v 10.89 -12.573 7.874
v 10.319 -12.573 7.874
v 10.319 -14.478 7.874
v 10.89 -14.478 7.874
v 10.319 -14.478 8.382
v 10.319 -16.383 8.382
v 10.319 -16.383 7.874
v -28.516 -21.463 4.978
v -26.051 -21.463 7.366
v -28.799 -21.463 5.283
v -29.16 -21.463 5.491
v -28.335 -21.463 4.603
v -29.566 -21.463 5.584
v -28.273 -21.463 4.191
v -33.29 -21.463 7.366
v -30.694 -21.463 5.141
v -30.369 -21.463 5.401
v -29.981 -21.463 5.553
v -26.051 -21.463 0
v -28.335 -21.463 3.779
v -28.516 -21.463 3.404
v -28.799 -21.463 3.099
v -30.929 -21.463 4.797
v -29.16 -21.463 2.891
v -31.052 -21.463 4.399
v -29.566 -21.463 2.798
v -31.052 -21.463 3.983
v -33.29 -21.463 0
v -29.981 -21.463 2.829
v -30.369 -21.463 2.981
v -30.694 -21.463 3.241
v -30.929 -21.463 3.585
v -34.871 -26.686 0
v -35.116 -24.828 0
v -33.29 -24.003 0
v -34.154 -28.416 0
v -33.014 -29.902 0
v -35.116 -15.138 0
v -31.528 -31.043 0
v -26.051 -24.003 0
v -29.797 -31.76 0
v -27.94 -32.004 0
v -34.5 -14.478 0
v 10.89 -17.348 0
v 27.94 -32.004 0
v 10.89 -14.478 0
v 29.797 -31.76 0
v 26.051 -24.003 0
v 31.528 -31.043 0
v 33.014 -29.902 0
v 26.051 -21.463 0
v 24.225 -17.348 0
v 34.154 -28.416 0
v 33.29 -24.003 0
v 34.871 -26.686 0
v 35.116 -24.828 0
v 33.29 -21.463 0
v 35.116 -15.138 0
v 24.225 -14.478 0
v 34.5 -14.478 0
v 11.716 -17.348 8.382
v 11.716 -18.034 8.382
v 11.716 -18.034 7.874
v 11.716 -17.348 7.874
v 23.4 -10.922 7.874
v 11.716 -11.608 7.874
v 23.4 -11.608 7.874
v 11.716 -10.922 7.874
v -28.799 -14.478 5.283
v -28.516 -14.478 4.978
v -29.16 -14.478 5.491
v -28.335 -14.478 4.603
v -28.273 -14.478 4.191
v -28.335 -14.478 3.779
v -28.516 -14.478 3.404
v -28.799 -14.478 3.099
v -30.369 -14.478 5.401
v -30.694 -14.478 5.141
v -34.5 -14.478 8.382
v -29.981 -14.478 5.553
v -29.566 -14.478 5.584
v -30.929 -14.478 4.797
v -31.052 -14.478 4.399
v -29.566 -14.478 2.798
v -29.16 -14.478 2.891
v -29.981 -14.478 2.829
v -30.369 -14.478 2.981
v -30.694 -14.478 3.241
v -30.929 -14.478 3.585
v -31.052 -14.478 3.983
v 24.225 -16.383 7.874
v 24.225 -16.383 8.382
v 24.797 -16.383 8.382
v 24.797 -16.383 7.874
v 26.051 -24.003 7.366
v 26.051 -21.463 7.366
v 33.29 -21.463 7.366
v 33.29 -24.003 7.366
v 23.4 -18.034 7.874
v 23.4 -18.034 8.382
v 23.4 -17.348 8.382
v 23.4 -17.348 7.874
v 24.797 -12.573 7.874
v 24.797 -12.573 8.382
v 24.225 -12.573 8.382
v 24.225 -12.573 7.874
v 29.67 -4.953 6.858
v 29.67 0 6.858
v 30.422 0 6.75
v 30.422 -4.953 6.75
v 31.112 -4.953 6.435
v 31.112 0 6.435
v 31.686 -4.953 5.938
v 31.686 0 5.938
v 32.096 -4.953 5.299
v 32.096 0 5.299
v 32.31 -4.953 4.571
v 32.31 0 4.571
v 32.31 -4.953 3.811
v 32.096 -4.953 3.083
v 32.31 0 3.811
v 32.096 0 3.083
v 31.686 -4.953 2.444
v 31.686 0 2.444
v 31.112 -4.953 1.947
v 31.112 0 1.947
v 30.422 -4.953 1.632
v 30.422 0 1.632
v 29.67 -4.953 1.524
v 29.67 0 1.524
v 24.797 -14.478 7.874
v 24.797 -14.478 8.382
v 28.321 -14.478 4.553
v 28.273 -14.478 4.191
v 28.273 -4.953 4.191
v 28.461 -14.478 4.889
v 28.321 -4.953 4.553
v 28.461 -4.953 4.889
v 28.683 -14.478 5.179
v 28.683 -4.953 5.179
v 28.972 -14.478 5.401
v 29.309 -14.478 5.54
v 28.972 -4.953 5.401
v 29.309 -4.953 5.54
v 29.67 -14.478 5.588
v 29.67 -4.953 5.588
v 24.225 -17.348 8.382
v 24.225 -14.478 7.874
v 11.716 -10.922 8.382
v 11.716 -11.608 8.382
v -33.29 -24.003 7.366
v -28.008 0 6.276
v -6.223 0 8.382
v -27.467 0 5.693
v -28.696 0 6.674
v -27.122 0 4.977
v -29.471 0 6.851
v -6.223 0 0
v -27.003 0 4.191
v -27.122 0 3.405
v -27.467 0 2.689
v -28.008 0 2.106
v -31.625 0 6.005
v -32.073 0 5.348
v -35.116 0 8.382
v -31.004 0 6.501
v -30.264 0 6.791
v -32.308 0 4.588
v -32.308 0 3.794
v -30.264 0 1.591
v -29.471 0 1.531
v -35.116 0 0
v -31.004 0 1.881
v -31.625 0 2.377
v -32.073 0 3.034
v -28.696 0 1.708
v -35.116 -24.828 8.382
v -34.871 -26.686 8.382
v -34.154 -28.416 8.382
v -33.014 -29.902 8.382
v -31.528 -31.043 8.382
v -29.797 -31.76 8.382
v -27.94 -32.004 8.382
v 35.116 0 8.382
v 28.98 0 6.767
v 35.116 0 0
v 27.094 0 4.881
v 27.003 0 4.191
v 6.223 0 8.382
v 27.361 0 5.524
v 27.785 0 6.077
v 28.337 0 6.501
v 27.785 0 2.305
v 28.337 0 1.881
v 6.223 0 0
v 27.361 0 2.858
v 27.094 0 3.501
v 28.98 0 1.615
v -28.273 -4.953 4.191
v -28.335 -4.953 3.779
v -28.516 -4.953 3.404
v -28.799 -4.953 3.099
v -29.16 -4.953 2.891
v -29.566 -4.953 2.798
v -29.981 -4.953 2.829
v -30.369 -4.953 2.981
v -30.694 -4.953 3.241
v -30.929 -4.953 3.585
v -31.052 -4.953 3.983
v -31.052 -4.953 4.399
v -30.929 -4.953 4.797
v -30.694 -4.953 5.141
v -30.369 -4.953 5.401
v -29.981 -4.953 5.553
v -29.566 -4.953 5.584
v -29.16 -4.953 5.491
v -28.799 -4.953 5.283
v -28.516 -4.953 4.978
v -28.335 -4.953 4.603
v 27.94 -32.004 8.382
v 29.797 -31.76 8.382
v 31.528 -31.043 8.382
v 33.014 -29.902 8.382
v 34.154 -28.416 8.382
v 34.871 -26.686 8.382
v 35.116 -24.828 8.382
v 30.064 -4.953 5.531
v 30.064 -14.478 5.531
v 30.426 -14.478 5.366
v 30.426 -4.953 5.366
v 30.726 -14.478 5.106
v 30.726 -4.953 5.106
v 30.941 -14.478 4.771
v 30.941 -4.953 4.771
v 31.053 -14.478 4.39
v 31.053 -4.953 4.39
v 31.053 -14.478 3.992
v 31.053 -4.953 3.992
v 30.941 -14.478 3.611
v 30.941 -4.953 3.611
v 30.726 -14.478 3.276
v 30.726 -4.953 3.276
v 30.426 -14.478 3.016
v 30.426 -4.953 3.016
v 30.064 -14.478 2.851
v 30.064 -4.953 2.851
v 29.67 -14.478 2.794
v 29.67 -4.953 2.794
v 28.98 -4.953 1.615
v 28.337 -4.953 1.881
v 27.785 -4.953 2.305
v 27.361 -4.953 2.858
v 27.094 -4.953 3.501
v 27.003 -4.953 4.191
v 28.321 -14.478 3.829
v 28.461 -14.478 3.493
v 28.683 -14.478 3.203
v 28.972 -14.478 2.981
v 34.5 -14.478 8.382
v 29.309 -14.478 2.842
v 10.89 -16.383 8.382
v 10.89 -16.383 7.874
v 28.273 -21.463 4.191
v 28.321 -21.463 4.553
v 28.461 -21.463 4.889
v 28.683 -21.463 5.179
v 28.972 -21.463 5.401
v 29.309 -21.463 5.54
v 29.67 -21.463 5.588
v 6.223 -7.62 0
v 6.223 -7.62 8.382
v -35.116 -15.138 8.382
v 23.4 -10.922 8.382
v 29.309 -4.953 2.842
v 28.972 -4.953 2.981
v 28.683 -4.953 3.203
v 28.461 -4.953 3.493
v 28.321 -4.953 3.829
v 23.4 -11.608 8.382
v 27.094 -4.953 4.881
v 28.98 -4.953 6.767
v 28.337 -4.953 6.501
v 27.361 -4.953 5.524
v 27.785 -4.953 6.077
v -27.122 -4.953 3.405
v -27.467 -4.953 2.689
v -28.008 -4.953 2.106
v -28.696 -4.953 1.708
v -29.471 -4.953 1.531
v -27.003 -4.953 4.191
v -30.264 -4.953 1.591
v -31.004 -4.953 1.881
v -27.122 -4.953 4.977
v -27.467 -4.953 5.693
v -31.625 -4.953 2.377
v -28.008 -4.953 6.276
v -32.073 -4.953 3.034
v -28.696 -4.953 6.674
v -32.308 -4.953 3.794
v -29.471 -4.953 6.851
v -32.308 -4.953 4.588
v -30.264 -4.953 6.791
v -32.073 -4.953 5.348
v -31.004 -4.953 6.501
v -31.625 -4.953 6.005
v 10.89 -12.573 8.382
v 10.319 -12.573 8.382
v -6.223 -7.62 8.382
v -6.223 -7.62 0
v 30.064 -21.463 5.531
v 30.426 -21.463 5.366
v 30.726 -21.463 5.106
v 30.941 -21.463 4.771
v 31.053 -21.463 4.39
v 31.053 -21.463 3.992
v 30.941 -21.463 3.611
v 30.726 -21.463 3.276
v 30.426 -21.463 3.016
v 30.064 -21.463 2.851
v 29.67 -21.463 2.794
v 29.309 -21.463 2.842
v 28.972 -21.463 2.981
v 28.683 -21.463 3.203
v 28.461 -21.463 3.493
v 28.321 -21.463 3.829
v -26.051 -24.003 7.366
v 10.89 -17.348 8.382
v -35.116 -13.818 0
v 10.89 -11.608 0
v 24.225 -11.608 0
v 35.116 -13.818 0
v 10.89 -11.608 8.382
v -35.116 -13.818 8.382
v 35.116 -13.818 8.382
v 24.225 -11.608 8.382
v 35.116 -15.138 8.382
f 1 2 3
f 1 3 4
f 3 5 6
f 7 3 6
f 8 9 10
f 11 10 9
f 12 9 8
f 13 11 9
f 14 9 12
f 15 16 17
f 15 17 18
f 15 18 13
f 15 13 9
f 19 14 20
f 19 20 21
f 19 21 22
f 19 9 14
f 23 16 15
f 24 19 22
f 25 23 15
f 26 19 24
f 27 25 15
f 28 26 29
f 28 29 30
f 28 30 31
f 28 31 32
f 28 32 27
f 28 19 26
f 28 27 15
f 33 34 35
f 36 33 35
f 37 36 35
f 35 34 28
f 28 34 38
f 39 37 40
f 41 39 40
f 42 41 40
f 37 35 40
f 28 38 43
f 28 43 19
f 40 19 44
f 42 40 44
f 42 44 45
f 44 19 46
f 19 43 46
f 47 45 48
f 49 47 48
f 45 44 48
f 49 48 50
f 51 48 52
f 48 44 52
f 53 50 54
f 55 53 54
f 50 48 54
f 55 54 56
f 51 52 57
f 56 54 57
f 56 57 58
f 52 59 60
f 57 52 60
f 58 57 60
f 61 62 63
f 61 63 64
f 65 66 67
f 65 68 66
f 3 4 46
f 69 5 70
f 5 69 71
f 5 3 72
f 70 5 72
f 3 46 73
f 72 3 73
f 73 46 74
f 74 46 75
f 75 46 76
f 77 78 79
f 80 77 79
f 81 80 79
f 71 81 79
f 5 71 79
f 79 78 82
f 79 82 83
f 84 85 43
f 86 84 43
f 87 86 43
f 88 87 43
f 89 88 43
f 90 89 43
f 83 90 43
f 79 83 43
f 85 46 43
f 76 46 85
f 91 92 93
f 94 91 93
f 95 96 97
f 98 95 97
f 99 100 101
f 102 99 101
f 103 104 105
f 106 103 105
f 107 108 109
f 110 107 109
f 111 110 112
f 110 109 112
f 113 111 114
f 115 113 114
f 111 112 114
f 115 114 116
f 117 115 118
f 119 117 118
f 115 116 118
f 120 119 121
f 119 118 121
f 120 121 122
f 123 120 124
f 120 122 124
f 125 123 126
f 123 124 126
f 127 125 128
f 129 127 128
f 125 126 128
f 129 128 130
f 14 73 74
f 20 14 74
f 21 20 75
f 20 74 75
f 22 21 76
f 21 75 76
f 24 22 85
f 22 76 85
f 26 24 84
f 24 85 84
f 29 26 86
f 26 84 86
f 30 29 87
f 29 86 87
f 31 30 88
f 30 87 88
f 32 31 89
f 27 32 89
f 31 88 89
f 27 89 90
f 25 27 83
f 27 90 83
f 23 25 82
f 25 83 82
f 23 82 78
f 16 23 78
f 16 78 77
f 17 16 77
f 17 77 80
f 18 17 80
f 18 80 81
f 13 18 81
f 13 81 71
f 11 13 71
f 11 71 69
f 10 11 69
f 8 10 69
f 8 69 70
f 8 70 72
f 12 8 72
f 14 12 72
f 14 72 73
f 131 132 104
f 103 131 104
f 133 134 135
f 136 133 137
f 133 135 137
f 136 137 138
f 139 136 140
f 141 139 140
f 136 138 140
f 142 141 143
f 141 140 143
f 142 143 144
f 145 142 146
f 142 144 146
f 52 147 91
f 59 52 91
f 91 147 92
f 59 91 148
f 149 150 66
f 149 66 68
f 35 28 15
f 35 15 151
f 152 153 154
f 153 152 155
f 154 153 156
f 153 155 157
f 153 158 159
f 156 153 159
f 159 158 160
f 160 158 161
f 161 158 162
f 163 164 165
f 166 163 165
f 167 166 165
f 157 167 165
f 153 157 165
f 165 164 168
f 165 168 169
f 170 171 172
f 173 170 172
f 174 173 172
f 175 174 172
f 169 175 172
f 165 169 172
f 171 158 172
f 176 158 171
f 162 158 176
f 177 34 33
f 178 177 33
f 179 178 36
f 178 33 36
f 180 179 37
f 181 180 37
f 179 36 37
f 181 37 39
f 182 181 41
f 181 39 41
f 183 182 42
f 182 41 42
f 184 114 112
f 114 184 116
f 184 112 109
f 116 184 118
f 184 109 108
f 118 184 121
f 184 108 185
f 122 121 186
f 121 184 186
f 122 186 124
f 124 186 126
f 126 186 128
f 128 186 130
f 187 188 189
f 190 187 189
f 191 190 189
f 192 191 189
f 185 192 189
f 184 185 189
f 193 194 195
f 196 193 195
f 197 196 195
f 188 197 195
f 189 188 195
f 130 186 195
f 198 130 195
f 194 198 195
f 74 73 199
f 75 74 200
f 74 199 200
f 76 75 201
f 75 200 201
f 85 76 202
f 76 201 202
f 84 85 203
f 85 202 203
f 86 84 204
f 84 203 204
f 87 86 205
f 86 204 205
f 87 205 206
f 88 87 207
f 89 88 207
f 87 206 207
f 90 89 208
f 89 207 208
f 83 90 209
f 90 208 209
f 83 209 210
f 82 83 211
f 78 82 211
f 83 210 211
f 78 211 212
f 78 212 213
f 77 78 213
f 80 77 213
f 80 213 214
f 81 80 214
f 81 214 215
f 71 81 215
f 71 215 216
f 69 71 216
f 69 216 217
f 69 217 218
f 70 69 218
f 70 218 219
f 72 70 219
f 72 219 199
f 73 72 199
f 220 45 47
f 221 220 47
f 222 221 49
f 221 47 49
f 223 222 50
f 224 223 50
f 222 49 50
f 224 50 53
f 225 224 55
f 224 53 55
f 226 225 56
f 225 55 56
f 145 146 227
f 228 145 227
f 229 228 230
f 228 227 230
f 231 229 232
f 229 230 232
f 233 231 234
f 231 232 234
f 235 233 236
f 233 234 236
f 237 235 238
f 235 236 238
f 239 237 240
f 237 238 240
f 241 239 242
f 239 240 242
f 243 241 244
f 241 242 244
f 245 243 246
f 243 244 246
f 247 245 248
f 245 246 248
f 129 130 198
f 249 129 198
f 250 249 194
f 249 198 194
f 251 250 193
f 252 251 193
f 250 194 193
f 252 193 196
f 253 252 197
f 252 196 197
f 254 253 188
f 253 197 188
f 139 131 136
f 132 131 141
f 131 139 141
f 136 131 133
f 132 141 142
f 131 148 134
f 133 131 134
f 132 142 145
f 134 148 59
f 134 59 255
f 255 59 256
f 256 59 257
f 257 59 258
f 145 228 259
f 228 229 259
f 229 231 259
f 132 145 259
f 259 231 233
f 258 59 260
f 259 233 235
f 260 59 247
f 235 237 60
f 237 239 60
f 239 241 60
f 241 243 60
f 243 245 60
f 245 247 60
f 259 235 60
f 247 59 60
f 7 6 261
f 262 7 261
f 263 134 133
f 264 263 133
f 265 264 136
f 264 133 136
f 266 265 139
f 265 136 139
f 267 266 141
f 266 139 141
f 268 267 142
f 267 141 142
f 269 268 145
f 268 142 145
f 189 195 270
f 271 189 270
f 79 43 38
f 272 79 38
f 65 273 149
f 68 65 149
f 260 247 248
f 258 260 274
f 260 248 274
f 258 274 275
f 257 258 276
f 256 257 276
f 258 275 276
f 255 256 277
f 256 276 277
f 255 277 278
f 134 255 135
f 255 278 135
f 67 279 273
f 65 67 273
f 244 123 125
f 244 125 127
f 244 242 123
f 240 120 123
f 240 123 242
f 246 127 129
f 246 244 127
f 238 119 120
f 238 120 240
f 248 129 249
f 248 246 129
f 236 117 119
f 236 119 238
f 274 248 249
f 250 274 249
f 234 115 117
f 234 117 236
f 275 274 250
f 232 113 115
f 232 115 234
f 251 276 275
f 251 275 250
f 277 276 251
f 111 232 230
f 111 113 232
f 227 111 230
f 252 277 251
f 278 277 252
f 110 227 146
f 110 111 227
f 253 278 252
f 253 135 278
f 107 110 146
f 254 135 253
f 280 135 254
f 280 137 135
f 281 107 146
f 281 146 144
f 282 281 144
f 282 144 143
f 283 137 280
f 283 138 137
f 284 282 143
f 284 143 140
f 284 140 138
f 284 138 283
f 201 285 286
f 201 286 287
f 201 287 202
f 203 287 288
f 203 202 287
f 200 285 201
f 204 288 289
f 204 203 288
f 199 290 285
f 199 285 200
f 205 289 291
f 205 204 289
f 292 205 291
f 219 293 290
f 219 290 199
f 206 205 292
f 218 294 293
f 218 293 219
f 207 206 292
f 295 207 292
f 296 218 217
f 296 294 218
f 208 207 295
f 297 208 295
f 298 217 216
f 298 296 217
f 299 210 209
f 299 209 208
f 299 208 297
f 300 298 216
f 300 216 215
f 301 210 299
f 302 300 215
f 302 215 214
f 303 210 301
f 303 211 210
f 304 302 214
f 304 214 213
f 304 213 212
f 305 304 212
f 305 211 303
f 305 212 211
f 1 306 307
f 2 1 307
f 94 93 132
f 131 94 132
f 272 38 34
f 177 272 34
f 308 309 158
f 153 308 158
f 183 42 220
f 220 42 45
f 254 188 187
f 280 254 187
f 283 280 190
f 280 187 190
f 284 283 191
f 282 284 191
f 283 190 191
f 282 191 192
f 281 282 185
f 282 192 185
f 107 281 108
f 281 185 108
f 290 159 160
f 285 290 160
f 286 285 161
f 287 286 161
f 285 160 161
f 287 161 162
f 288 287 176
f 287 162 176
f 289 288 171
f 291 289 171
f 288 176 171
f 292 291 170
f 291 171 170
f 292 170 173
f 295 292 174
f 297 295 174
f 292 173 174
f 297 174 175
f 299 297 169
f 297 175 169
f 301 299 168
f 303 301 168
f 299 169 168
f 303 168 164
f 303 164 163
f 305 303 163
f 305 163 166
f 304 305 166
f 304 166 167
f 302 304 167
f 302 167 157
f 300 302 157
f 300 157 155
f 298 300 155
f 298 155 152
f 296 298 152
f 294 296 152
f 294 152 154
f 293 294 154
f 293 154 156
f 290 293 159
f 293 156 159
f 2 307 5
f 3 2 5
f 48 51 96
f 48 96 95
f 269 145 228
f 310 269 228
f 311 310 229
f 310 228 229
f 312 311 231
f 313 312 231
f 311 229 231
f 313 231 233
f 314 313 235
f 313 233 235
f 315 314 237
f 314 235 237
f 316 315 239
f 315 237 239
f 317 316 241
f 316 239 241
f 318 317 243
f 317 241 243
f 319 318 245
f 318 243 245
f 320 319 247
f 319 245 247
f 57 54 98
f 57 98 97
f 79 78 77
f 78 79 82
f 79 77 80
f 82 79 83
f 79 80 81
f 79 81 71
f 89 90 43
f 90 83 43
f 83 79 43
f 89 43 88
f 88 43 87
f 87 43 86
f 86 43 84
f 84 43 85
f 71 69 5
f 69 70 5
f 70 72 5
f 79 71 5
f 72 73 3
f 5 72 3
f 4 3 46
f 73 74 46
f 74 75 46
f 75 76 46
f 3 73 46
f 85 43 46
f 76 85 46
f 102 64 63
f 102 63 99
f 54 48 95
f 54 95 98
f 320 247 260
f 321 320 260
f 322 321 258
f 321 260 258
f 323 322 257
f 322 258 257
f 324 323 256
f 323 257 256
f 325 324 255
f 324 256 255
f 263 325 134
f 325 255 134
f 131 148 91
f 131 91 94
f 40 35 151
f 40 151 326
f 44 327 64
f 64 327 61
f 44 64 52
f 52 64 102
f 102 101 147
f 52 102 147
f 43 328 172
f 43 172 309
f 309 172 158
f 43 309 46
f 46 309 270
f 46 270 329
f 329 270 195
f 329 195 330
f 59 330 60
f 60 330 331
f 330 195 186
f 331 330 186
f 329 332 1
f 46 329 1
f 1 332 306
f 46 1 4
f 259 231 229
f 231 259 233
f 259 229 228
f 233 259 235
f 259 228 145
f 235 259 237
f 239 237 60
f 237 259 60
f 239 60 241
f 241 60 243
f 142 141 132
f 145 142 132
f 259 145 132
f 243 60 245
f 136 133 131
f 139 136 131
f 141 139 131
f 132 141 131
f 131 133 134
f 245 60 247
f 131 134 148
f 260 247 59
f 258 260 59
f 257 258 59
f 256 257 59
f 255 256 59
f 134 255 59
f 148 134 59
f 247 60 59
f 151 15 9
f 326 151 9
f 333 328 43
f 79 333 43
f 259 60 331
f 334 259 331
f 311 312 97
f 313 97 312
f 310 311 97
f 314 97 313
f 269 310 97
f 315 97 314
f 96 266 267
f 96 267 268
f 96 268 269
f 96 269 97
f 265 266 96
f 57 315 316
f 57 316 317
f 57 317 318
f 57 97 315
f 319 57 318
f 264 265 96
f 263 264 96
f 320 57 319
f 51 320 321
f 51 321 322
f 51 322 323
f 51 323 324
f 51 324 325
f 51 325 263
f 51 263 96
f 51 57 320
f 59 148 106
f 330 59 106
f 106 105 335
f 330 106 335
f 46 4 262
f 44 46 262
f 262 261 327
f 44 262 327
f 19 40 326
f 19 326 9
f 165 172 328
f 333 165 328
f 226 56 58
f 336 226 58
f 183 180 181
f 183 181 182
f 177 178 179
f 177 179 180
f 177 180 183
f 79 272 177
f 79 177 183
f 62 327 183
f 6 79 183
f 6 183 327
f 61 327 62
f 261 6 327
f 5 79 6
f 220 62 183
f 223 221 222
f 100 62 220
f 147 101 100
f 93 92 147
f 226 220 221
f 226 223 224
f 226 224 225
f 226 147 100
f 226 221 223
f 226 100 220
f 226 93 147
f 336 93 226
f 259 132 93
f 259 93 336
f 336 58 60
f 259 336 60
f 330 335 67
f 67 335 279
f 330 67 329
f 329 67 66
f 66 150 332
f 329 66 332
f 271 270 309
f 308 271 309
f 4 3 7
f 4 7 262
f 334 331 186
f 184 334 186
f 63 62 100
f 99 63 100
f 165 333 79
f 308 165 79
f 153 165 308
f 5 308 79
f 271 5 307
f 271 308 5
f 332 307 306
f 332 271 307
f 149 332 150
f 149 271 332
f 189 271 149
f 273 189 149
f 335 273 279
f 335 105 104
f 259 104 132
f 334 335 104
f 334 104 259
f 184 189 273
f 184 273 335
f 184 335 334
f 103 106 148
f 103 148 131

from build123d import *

# Parameters (mm, degrees)
F1_DEPTH  = 8.382
F2_DEPTH  = 8.382
F3_W      = 6.6675
F3_H      = 2.8702
F4_DEPTH  = 25.4
F5_W      = 3.6195
F5_H      = 1.27
F6_DEPTH  = 7.366
F8_DEPTH  = 24.003
F9_DEPTH  = 4.953
F10_W     = 0.5715
F10_H     = 1.905
F10_W_2   = 5.842
F10_H_2   = 1.651
F10_H_3   = 0.6858
F11_DEPTH = 0.508


with BuildPart() as f1:
    # F0 (on Top) → F1 (new body)
    with BuildSketch(Plane.XY):
        Polygon((-6.223, -7.62), (-6.223, 0), (-35.1155, 0), (-35.1155, -13.8176), (-34.49955, -14.478), (0, -14.478), (0, -7.62), align=None)
        Polygon((35.1155, 0), (6.223, 0), (6.223, -7.62), (0, -7.62), (0, -14.478), (34.49955, -14.478), (35.1155, -13.8176), align=None)
    extrude(amount=F1_DEPTH)


with BuildPart() as f2:
    # F0 (on Top) → F2 (new body)
    with BuildSketch(Plane.XY):
        with BuildLine():
            Line((0, -32.004), (0, -14.478))
            Line((0, -14.478), (-34.49955, -14.478))
            Line((-34.49955, -14.478), (-35.1155, -15.1384))
            Line((-35.1155, -15.1384), (-35.1155, -24.8285))
            ThreePointArc((-35.1155, -24.8285), (-27.94, -17.653), (-20.7645, -24.8285))
            ThreePointArc((-20.7645, -24.8285), (-22.8661552916, -29.9023447084), (-27.94, -32.004))
            Line((-27.94, -32.004), (0, -32.004))
        make_face()
        with BuildLine():
            ThreePointArc((-35.1155, -24.8285), (-33.0138447084, -29.9023447084), (-27.94, -32.004))
            ThreePointArc((-27.94, -32.004), (-22.8661552916, -29.9023447084), (-20.7645, -24.8285))
            ThreePointArc((-20.7645, -24.8285), (-27.94, -17.653), (-35.1155, -24.8285))
        make_face()
        with BuildLine():
            Line((34.49955, -14.478), (0, -14.478))
            Line((0, -14.478), (0, -32.004))
            Line((0, -32.004), (27.94, -32.004))
            ThreePointArc((27.94, -32.004), (22.8661552916, -19.7546552916), (35.1155, -24.8285))
            Line((35.1155, -24.8285), (35.1155, -15.1384))
            Line((35.1155, -15.1384), (34.49955, -14.478))
        make_face()
        with BuildLine():
            ThreePointArc((35.1155, -24.8285), (22.8661552916, -19.7546552916), (27.94, -32.004))
            ThreePointArc((27.94, -32.004), (33.0138447084, -29.9023447084), (35.1155, -24.8285))
        make_face()
    extrude(amount=F2_DEPTH)


with BuildPart() as f4_tool:
    # F3 (on face) → F4 (new body)
    with BuildSketch(Plane.XY.offset(8.382)):
        with Locations((14.224, -13.0429)):
            Rectangle(F3_W, F3_H)
        with Locations((20.8915, -13.0429)):
            Rectangle(F3_W, F3_H)
        Polygon((17.55775, -14.478), (10.89025, -14.478), (10.89025, -17.3482), (24.22525, -17.3482), (24.22525, -14.478), align=None)
    extrude(amount=-F4_DEPTH)


with BuildPart() as f1_1:
    add(f1.part)

    # F4: cut by f4_tool
    add(f4_tool.part, mode=Mode.SUBTRACT)


with BuildPart() as f2_1:
    add(f2.part)

    # F4: cut by f4_tool
    add(f4_tool.part, mode=Mode.SUBTRACT)

    # F5 (on Top) → F6 (cut)
    with BuildSketch(Plane.XY):
        Polygon((33.289875, -21.463), (29.670375, -21.463), (29.670375, -22.733), (29.670375, -24.003), (33.289875, -24.003), align=None)
        with Locations((27.860625, -22.098)):
            Rectangle(F5_W, F5_H)
        with Locations((27.860625, -23.368)):
            Rectangle(F5_W, F5_H)
        Polygon((-26.050875, -24.003), (-26.050875, -22.733), (-26.050875, -21.463), (-33.289875, -21.463), (-33.289875, -24.003), align=None)
    extrude(amount=F6_DEPTH, mode=Mode.SUBTRACT)


with BuildPart() as f8_tool:
    # F7 (on face) → F8 (new body)
    with BuildSketch(Plane(origin=(0, 0, 0), x_dir=(-1, 0, 0), z_dir=(0, 1, 0))):
        with BuildLine():
            Line((-29.670375, 4.191), (-29.670375, 2.794))
            ThreePointArc((-29.670375, 2.794), (-28.6825468267, 3.2031718267), (-28.273375, 4.191))
            Line((-28.273375, 4.191), (-29.670375, 4.191))
        make_face()
        with BuildLine():
            Line((-29.670375, 5.588), (-29.670375, 4.191))
            Line((-29.670375, 4.191), (-28.273375, 4.191))
            ThreePointArc((-28.273375, 4.191), (-28.6825468267, 5.1788281733), (-29.670375, 5.588))
        make_face()
        with BuildLine():
            ThreePointArc((-29.670375, 5.588), (-31.067375, 4.191), (-29.670375, 2.794))
            Line((-29.670375, 2.794), (-29.670375, 4.191))
            Line((-29.670375, 4.191), (-29.670375, 5.588))
        make_face()
        with BuildLine():
            ThreePointArc((31.067375, 4.191), (29.670375, 5.588), (28.273375, 4.191))
            ThreePointArc((28.273375, 4.191), (29.670375, 2.794), (31.067375, 4.191))
        make_face()
    extrude(amount=-F8_DEPTH)


with BuildPart() as f1_2:
    add(f1_1.part)

    # F8: cut by f8_tool
    add(f8_tool.part, mode=Mode.SUBTRACT)

    # F7 (on face) → F9 (cut)
    with BuildSketch(Plane(origin=(0, 0, 0), x_dir=(-1, 0, 0), z_dir=(0, 1, 0))):
        with BuildLine():
            ThreePointArc((-27.003375, 4.191), (-27.7845212146, 6.0768537854), (-29.670375, 6.858))
            Line((-29.670375, 6.858), (-29.670375, 5.588))
            ThreePointArc((-29.670375, 5.588), (-28.6825468267, 5.1788281733), (-28.273375, 4.191))
            Line((-28.273375, 4.191), (-27.003375, 4.191))
        make_face()
        with BuildLine():
            ThreePointArc((-29.670375, 6.858), (-32.337375, 4.191), (-29.670375, 1.524))
            Line((-29.670375, 1.524), (-29.670375, 2.794))
            ThreePointArc((-29.670375, 2.794), (-31.067375, 4.191), (-29.670375, 5.588))
            Line((-29.670375, 5.588), (-29.670375, 6.858))
        make_face()
        with BuildLine():
            Line((-29.670375, 2.794), (-29.670375, 1.524))
            ThreePointArc((-29.670375, 1.524), (-27.7845212146, 2.3051462146), (-27.003375, 4.191))
            Line((-27.003375, 4.191), (-28.273375, 4.191))
            ThreePointArc((-28.273375, 4.191), (-28.6825468267, 3.2031718267), (-29.670375, 2.794))
        make_face()
        with BuildLine():
            ThreePointArc((32.337375, 4.191), (29.670375, 6.858), (27.003375, 4.191))
            ThreePointArc((27.003375, 4.191), (29.670375, 1.524), (32.337375, 4.191))
        make_face()
        with BuildLine():
            ThreePointArc((31.067375, 4.191), (29.670375, 2.794), (28.273375, 4.191))
            ThreePointArc((28.273375, 4.191), (29.670375, 5.588), (31.067375, 4.191))
        make_face(mode=Mode.SUBTRACT)
    extrude(amount=-F9_DEPTH, mode=Mode.SUBTRACT)


with BuildPart() as f2_2:
    add(f2_1.part)

    # F8: cut by f8_tool
    add(f8_tool.part, mode=Mode.SUBTRACT)


with BuildPart() as f11_tool:
    # F10 (on face) → F11 (new body)
    with BuildSketch(Plane.XY.offset(8.382)):
        with Locations((10.6045, -15.4305)):
            Rectangle(F10_W, F10_H)
        with Locations((20.47875, -11.7475)):
            Rectangle(F10_W_2, F10_H_2)
        with Locations((24.511, -15.4305)):
            Rectangle(F10_W, F10_H)
        Polygon((23.39975, -12.573), (23.39975, -14.478), (24.22525, -14.478), (24.79675, -14.478), (24.79675, -12.573), align=None)
        Polygon((10.31875, -14.478), (10.89025, -14.478), (11.71575, -14.478), (11.71575, -12.573), (10.31875, -12.573), align=None)
        with Locations((14.63675, -17.6911)):
            Rectangle(F10_W_2, F10_H_3)
        with Locations((20.47875, -17.6911)):
            Rectangle(F10_W_2, F10_H_3)
        with Locations((14.63675, -11.7475)):
            Rectangle(F10_W_2, F10_H_2)
    extrude(amount=-F11_DEPTH)


with BuildPart() as f1_3:
    add(f1_2.part)

    # F11: cut by f11_tool
    add(f11_tool.part, mode=Mode.SUBTRACT)


with BuildPart() as f2_3:
    add(f2_2.part)

    # F11: cut by f11_tool
    add(f11_tool.part, mode=Mode.SUBTRACT)


solid = Compound([f1_3.part, f2_3.part])
